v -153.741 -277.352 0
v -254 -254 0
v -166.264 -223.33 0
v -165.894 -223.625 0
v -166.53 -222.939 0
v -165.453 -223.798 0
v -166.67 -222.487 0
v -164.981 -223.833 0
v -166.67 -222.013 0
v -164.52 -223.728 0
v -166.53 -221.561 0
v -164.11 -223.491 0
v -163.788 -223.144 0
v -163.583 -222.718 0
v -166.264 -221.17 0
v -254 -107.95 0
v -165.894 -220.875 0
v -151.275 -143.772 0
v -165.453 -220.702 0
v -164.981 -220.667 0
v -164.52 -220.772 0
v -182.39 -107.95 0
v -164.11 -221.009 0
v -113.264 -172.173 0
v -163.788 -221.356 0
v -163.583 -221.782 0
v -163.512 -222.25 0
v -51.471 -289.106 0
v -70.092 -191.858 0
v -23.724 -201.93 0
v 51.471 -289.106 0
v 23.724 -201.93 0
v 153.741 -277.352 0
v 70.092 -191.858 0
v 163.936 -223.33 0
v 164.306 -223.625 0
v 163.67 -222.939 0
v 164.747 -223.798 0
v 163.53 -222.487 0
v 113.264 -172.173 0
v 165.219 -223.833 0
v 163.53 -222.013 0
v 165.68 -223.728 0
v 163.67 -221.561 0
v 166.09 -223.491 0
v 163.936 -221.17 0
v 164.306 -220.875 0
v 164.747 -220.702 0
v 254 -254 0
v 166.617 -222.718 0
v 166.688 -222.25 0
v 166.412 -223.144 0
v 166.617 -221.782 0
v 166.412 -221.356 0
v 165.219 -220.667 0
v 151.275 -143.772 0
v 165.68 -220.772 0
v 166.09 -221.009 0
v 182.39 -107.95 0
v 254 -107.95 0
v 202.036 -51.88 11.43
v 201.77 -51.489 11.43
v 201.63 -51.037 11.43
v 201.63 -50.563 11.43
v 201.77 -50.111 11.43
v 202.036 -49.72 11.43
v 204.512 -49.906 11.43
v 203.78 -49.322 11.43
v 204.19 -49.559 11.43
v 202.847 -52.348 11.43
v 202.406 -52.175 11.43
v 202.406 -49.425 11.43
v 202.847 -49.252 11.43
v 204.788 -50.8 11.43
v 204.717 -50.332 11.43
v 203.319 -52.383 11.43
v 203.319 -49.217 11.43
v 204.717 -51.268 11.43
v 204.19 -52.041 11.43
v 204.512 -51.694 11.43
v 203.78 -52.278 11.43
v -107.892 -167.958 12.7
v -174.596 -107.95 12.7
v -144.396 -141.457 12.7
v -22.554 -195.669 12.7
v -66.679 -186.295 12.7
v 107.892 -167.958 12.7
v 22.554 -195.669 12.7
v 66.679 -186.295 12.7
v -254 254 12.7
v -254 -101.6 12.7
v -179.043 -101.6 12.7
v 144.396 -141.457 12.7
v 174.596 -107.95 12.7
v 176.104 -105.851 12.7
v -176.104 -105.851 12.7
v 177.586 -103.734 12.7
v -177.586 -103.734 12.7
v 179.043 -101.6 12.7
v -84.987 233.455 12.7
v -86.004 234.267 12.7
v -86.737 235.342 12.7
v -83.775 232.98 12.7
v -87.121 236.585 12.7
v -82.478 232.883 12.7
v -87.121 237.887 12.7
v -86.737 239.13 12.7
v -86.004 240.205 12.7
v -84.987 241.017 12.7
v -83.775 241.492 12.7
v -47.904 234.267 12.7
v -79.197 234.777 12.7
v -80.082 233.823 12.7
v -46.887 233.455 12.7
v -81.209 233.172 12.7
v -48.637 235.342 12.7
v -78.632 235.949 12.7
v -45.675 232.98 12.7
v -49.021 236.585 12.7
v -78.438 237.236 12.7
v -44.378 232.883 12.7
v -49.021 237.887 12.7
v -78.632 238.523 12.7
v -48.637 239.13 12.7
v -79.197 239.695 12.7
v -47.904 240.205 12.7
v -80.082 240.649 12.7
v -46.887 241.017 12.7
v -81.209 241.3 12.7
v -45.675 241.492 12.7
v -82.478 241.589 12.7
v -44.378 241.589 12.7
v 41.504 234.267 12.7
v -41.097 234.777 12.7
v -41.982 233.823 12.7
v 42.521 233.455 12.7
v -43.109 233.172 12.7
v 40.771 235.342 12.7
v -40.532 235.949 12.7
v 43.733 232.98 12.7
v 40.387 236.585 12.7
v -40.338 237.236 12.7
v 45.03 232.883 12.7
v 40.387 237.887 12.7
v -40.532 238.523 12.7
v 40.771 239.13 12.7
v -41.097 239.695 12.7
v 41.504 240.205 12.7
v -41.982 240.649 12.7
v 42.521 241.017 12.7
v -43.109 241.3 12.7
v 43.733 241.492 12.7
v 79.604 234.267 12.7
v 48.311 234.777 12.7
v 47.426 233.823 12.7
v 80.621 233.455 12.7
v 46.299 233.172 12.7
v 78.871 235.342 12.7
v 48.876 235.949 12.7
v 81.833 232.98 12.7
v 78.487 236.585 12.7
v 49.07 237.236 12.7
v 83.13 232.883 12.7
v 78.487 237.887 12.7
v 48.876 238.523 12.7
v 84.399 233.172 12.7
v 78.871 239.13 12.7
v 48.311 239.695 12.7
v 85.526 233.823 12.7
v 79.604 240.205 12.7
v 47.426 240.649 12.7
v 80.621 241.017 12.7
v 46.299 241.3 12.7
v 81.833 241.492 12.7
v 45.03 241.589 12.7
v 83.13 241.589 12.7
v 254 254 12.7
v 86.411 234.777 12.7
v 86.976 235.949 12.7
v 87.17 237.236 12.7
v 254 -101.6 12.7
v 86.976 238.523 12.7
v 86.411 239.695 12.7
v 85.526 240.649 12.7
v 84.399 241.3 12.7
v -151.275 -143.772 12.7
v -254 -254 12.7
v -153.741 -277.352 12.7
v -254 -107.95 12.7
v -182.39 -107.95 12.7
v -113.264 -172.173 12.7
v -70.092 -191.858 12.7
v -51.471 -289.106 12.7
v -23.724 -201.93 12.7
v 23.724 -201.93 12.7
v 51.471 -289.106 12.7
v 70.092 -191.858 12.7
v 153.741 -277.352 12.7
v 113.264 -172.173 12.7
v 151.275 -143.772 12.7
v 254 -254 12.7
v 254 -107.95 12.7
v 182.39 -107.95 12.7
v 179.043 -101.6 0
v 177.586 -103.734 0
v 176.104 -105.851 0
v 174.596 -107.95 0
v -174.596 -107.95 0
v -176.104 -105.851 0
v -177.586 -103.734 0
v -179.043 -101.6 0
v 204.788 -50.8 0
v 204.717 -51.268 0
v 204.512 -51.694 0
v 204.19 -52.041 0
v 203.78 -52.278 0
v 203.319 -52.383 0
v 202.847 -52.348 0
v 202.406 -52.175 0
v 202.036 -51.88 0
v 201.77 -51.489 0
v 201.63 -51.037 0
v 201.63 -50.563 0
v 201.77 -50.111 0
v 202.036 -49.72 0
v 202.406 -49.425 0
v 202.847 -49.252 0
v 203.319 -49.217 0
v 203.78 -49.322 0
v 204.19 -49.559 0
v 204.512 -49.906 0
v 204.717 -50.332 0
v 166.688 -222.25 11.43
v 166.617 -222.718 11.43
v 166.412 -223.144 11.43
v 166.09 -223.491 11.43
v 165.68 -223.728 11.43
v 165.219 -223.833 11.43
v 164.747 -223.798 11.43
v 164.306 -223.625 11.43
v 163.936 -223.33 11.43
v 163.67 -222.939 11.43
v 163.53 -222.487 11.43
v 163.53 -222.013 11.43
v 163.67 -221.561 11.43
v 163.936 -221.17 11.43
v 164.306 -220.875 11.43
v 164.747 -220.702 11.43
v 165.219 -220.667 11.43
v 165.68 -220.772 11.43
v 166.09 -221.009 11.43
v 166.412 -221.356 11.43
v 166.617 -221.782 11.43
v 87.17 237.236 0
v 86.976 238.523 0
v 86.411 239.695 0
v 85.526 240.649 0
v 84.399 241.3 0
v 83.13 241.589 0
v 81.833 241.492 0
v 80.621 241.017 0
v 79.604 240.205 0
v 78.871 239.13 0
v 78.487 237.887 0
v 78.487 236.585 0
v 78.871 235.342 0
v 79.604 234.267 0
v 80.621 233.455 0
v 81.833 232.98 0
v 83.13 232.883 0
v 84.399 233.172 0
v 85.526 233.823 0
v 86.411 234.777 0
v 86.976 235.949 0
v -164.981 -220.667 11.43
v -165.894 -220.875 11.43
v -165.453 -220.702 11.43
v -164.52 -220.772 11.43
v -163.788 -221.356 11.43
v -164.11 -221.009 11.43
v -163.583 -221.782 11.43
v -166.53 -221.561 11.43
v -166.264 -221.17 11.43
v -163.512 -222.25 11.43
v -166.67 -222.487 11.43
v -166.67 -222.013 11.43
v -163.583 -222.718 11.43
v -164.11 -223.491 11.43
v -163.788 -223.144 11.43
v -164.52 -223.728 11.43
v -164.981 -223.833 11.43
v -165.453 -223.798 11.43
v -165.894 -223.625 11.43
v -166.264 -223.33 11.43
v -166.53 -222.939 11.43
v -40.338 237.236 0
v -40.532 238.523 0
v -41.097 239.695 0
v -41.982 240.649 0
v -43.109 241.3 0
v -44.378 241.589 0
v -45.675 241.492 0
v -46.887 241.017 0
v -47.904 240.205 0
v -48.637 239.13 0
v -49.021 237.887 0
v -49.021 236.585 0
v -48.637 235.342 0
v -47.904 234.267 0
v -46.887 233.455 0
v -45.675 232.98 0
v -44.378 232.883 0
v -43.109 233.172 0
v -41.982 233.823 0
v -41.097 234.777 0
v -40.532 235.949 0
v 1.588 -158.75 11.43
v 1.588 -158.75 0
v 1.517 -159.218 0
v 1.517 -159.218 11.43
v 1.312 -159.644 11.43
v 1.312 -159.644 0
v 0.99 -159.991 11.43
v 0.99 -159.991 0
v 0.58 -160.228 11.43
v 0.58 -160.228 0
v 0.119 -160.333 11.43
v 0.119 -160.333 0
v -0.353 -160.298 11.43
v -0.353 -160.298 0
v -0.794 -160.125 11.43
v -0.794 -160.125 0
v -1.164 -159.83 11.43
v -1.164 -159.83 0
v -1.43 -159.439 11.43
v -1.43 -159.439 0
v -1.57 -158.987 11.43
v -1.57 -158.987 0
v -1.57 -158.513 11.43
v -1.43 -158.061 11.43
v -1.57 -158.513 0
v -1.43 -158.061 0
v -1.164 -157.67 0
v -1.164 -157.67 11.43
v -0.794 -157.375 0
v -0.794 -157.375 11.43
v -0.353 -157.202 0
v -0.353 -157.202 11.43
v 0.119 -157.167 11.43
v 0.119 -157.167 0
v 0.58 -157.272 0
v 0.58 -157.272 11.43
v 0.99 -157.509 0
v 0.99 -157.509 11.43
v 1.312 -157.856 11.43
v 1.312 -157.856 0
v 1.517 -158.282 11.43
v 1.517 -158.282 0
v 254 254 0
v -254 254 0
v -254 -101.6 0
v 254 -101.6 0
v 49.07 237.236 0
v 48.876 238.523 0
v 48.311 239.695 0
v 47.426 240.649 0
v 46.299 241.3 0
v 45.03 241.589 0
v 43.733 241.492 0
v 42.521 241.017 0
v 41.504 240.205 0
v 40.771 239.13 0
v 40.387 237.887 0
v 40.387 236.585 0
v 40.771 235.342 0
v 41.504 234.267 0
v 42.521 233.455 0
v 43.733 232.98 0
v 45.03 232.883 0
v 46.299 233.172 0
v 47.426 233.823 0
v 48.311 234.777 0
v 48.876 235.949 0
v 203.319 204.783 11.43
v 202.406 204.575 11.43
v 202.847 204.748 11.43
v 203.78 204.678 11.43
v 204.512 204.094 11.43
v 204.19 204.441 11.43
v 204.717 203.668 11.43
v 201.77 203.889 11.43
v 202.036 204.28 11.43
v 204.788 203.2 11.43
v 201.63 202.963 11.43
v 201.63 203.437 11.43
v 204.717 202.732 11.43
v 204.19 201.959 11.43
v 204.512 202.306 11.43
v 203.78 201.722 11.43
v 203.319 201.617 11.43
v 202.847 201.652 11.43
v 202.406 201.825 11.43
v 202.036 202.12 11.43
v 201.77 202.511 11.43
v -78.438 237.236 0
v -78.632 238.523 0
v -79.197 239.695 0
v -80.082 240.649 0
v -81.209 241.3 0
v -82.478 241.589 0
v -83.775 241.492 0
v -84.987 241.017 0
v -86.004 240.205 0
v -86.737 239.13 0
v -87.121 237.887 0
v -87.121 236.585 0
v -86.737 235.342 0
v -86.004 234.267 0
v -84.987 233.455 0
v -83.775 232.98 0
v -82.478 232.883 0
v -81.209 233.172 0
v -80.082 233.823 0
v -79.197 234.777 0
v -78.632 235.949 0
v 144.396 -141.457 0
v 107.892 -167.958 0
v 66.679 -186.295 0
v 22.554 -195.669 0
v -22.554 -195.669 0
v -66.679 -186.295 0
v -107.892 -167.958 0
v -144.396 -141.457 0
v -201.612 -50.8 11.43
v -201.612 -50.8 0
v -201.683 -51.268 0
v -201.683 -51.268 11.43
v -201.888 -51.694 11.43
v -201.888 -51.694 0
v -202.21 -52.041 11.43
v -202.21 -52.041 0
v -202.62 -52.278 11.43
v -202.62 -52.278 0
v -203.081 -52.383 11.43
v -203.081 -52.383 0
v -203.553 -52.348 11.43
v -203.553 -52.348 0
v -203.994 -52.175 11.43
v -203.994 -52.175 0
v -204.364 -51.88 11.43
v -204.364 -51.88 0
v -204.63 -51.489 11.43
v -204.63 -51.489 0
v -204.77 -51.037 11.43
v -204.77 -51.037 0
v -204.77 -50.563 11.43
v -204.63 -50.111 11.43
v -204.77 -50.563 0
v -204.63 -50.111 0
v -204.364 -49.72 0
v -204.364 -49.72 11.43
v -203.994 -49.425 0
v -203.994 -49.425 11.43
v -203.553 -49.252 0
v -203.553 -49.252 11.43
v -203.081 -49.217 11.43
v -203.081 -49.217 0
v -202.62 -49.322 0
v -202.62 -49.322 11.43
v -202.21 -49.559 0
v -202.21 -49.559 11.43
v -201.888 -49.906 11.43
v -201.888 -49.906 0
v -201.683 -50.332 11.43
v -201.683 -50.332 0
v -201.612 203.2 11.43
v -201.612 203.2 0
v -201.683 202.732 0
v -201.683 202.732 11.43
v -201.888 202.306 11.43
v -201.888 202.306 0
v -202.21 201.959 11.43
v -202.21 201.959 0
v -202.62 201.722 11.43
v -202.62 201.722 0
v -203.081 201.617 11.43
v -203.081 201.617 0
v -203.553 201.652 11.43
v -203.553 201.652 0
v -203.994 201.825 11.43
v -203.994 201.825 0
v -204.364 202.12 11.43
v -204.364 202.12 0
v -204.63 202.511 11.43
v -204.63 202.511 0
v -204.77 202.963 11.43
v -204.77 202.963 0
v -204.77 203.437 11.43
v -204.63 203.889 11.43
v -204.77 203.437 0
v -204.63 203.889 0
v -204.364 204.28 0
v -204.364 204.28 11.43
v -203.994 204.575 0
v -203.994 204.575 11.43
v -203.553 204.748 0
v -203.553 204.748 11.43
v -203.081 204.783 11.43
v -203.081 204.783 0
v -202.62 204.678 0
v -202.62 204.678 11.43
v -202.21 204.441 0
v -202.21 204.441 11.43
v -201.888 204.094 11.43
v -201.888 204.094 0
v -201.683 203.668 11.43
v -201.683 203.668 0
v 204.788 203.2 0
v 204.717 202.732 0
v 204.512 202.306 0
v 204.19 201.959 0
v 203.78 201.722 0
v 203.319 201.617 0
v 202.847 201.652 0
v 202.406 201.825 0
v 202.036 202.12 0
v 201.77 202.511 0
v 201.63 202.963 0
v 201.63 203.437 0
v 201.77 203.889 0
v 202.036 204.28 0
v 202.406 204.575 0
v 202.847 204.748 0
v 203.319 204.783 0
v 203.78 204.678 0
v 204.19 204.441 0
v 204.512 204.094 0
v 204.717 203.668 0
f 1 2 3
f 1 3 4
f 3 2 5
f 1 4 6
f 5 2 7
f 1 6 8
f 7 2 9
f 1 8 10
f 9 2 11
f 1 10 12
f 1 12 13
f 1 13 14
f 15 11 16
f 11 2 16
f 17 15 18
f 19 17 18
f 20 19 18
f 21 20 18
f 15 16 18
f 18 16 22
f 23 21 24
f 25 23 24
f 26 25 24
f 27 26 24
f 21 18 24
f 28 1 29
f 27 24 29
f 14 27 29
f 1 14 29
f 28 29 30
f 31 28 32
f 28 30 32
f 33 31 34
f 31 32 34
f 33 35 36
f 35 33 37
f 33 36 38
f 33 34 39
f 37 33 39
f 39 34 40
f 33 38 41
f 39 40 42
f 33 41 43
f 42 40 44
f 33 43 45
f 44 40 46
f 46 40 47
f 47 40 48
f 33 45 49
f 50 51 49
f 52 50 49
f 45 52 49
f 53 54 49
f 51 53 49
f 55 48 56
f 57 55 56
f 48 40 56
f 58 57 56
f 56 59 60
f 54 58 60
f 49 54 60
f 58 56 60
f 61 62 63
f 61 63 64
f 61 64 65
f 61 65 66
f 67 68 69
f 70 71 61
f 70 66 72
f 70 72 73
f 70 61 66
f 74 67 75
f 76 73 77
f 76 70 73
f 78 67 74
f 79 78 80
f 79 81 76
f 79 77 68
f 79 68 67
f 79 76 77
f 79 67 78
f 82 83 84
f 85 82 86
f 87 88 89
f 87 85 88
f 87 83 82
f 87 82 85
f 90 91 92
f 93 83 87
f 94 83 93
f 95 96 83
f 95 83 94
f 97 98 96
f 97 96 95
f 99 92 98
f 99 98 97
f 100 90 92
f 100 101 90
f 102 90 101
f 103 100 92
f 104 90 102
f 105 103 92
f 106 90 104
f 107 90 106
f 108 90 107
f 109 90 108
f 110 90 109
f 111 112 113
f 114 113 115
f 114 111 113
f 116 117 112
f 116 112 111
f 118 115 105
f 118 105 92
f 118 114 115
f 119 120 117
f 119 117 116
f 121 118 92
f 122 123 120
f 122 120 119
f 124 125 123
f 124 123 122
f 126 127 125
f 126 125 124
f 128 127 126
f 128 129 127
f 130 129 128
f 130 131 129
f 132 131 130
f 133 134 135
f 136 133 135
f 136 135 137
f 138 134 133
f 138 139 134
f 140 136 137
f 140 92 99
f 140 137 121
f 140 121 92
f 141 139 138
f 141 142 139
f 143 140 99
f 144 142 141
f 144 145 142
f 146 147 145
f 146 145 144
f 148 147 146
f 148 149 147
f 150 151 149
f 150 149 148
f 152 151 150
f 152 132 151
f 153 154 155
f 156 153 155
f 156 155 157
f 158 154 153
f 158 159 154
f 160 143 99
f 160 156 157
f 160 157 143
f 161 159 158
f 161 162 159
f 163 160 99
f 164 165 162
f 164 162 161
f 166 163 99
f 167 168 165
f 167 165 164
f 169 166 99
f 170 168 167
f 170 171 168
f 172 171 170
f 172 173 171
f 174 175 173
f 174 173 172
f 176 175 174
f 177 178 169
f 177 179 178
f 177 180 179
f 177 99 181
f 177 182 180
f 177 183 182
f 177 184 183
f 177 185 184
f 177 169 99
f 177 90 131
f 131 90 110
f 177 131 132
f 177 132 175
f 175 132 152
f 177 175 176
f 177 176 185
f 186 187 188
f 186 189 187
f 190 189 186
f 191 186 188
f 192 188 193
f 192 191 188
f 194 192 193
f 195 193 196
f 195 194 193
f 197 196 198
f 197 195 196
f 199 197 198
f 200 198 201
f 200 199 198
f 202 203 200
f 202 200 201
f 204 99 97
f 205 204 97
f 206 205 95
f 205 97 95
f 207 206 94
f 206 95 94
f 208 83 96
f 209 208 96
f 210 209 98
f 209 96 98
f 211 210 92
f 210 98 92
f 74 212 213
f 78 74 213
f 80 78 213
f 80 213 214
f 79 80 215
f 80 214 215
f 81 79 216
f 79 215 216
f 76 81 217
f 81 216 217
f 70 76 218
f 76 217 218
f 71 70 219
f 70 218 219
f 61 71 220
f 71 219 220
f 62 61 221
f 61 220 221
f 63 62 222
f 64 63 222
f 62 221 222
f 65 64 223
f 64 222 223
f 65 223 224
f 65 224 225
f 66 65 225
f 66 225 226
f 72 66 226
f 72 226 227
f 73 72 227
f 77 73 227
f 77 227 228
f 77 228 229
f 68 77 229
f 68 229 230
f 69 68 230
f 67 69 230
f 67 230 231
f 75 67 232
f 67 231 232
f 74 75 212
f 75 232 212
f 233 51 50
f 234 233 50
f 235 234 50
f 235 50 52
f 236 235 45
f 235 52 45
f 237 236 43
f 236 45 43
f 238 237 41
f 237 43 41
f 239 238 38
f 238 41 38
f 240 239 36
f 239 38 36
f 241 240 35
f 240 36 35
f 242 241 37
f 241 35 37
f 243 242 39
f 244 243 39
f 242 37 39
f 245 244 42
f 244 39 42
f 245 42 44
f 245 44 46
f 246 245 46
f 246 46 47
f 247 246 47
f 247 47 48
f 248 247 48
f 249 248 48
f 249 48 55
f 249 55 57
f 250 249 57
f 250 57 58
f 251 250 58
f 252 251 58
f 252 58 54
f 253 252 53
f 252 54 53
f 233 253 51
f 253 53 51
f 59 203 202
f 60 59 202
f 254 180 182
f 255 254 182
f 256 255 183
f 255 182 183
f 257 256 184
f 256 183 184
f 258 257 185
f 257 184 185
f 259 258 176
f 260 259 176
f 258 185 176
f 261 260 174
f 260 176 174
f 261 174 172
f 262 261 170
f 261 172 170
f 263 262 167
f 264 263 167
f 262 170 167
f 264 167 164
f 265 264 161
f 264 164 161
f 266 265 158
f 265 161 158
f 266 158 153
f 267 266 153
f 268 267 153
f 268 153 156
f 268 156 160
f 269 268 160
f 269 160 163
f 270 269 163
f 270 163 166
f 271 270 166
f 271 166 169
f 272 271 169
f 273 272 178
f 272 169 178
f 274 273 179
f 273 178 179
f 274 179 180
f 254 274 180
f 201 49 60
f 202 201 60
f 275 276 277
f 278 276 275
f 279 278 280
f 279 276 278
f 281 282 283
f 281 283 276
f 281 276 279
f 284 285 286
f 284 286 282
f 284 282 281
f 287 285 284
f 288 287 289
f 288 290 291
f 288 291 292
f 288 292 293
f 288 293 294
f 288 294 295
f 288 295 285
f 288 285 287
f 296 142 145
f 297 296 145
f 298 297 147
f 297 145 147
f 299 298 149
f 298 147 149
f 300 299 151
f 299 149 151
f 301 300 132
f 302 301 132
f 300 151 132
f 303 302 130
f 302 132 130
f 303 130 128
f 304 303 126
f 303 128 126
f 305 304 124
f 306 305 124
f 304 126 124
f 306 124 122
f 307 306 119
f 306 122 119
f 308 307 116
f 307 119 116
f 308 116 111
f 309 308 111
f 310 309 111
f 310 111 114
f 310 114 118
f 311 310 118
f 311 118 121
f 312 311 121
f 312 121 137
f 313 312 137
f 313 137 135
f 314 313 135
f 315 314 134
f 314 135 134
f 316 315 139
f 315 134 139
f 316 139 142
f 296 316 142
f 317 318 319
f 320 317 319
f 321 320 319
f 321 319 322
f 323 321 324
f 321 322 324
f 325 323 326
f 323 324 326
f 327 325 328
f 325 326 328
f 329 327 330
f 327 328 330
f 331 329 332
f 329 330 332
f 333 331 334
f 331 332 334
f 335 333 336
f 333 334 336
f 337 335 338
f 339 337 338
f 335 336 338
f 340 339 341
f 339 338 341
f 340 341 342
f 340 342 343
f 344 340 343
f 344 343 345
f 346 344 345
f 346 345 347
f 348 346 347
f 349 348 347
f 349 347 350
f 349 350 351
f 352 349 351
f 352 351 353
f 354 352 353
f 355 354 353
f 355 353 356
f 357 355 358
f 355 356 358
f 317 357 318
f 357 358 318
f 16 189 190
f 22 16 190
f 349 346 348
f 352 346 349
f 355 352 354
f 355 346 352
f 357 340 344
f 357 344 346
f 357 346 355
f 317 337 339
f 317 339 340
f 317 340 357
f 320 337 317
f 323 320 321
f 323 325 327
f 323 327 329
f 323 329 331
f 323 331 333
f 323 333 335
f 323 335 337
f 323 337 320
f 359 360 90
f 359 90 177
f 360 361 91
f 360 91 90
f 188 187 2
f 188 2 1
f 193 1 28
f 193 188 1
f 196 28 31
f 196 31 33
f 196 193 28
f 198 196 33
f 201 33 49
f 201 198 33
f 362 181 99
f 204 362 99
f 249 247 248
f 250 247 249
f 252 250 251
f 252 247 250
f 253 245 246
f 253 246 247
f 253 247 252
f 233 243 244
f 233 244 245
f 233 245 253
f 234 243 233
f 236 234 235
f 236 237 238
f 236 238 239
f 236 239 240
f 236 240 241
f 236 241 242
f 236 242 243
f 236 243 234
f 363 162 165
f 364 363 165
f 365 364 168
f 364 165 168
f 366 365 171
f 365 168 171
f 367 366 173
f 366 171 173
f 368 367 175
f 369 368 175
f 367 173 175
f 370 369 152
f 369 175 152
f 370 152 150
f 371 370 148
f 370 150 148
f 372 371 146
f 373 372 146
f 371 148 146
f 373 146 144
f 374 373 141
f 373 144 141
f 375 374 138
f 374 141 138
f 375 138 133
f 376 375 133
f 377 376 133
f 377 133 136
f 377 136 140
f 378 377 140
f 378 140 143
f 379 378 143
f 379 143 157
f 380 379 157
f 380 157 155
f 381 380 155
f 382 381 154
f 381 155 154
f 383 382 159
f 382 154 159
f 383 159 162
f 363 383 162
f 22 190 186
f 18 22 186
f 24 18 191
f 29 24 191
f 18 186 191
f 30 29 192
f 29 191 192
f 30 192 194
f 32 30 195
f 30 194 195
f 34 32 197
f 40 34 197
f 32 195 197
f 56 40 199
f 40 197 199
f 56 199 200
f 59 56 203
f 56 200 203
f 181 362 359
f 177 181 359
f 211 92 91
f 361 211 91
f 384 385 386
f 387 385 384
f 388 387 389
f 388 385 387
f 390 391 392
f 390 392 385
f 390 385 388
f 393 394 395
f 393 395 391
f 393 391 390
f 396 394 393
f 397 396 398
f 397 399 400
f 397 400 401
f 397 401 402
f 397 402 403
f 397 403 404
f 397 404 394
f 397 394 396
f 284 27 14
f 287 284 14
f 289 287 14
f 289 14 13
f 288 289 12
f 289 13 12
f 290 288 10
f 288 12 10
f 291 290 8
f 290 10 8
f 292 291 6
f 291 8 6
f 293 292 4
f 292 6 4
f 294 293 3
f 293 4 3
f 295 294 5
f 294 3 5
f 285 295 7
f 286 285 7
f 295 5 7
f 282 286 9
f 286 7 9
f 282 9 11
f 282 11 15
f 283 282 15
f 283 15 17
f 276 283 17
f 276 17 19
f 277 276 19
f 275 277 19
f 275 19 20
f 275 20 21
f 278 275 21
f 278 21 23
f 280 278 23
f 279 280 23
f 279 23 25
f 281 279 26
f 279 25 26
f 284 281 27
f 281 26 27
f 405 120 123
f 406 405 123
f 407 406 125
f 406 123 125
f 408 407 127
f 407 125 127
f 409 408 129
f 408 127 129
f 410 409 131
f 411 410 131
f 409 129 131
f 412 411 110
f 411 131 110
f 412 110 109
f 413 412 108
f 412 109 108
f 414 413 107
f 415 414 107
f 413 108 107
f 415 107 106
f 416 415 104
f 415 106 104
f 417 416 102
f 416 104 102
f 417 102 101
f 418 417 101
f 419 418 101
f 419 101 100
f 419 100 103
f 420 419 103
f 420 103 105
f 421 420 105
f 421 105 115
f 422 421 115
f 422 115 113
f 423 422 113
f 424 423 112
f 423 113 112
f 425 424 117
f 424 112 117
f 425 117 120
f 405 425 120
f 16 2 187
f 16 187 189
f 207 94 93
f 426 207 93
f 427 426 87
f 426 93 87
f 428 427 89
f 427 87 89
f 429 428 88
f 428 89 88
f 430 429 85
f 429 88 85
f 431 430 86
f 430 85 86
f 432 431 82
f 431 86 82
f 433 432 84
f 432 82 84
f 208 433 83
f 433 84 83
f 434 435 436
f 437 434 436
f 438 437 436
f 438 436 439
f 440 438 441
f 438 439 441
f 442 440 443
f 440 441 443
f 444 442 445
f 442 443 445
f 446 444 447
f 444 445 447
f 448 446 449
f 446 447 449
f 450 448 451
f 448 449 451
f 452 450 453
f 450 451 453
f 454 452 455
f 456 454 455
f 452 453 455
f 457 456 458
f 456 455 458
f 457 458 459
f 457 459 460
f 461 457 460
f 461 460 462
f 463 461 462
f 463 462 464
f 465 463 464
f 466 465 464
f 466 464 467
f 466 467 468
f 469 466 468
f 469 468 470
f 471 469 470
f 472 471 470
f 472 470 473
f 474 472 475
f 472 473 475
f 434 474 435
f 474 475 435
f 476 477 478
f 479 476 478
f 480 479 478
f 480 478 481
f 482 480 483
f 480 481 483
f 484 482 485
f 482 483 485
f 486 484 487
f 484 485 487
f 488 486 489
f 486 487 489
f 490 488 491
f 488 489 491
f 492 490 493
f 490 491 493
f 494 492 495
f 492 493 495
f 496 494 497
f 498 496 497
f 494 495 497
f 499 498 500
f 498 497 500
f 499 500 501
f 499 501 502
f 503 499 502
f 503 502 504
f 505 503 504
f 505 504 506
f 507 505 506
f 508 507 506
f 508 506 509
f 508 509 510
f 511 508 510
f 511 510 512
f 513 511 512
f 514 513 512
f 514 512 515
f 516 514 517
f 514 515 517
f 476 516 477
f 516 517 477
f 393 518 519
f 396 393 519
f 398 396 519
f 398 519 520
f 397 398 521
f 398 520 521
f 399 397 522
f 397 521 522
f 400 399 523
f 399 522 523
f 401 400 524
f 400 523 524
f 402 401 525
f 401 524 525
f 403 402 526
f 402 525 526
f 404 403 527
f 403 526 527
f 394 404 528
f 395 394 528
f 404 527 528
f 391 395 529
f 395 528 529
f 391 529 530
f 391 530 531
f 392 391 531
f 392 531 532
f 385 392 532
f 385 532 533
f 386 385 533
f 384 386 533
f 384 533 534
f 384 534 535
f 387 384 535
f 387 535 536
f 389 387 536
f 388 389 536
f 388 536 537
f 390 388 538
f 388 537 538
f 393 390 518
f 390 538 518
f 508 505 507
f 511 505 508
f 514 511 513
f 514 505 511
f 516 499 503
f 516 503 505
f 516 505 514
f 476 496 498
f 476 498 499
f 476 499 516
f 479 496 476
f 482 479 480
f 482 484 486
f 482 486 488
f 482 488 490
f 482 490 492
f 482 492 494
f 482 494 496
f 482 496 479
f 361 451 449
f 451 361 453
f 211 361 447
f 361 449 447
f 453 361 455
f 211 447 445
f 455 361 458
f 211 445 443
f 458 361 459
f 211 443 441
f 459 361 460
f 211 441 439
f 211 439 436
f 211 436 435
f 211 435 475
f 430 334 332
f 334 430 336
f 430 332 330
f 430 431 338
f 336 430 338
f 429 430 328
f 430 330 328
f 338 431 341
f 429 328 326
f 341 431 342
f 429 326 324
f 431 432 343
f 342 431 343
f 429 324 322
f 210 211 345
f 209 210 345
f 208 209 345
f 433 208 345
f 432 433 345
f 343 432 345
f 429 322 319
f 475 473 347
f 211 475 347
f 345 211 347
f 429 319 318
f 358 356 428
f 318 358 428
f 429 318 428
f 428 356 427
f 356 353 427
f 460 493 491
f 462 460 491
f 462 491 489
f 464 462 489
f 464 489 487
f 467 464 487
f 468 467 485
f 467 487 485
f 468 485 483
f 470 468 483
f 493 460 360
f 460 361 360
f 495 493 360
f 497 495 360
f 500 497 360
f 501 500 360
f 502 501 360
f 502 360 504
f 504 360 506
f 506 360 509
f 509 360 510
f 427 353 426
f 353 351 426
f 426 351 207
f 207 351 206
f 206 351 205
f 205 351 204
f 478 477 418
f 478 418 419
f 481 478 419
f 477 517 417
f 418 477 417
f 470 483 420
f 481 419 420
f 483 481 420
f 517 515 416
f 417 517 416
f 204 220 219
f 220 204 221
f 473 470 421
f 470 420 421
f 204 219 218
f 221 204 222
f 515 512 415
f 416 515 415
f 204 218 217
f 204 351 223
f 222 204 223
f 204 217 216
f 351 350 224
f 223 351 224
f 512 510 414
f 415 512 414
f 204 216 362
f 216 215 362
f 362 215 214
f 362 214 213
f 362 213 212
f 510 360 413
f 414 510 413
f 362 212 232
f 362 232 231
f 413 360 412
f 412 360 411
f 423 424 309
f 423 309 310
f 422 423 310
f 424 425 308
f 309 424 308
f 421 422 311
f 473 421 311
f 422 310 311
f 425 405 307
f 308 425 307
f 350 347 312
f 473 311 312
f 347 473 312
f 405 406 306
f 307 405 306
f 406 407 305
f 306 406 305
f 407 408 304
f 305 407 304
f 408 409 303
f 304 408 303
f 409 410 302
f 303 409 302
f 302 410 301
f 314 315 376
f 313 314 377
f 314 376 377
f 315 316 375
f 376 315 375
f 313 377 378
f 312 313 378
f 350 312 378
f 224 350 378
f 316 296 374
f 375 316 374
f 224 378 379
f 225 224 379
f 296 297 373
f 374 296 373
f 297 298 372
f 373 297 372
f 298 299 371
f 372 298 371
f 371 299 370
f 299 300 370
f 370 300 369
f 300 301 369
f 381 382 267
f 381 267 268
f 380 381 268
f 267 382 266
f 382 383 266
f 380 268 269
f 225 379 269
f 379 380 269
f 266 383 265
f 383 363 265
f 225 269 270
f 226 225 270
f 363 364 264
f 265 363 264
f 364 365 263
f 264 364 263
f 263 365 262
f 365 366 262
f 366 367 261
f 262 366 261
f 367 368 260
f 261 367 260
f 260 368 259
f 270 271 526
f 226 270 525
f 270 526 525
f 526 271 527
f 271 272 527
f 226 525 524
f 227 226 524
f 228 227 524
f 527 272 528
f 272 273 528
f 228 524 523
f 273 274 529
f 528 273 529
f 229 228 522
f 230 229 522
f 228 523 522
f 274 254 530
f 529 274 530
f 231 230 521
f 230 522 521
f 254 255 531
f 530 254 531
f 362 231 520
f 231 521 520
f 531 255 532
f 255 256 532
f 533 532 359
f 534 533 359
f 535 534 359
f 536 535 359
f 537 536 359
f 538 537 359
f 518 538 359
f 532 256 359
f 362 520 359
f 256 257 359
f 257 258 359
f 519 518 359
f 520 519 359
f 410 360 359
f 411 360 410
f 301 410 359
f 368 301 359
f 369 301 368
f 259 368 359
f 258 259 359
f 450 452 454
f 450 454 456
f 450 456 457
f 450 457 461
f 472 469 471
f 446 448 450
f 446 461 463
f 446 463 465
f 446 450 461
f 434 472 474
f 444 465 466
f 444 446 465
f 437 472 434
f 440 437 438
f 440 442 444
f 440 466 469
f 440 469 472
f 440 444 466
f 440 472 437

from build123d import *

# Parameters (mm, degrees)
F0_W      = 508
F0_H      = 508
F1_DEPTH  = 12.7
F3_DEPTH  = 25.4
F5_DEPTH  = 12.7
F6_R      = 1.5875
F7_DEPTH  = 11.43
F8_R      = 1.5875
F9_DEPTH  = 11.43
F10_R     = 4.365625
F11_DEPTH = 12.7


with BuildPart() as f1:
    # F0 (on Top) → F1 (new body)
    with BuildSketch(Plane.XY):
        Rectangle(F0_W, F0_H)
    extrude(amount=F1_DEPTH)

    # F2 (on face) → F3 (cut)
    with BuildSketch(Plane.XY.offset(12.7)):
        with BuildLine():
            ThreePointArc((174.5961339778, -107.95), (0, -196.85), (-174.5961339778, -107.95))
            ThreePointArc((-174.5961339778, -107.95), (-176.8480584357, -104.7949604446), (-179.0429766844, -101.6))
            Line((-179.0429766844, -101.6), (-186.6511184001, -101.6))
            Line((-186.6511184001, -101.6), (-254, -101.6))
            Line((-254, -101.6), (-254, -107.95))
            Line((-254, -107.95), (-182.3898640276, -107.95))
            ThreePointArc((-182.3898640276, -107.95), (0, -203.2), (182.3898640276, -107.95))
            Line((182.3898640276, -107.95), (254, -107.95))
            Line((254, -107.95), (254, -101.6))
            Line((254, -101.6), (186.6511184001, -101.6))
            Line((186.6511184001, -101.6), (179.0429766844, -101.6))
            ThreePointArc((179.0429766844, -101.6), (176.8480584357, -104.7949604446), (174.5961339778, -107.95))
        make_face()
    extrude(amount=-F3_DEPTH, mode=Mode.SUBTRACT)

    # F4 (on face) → F5 (join, through all)
    with BuildSketch(Plane.XY.offset(12.7)):
        with BuildLine():
            Line((254, -254), (-254, -254))
            ThreePointArc((-254, -254), (0, -290.5782934508), (254, -254))
        make_face()
    extrude(amount=-F5_DEPTH)

    # F6 (on face) → F7 (cut)
    with BuildSketch(Plane(origin=(0, 0, 0), x_dir=(1, 0, 0), z_dir=(0, 0, -1))):
        with Locations((203.2, -203.2)):
            Circle(F6_R)
        with Locations((-203.2, -203.2)):
            Circle(F6_R)
        with Locations((-203.2, 50.8)):
            Circle(F6_R)
        with Locations((203.2, 50.8)):
            Circle(F6_R)
        with Locations((0, 158.75)):
            Circle(F6_R)
    extrude(amount=-F7_DEPTH, mode=Mode.SUBTRACT)

    # F8 (on face) → F9 (cut)
    with BuildSketch(Plane(origin=(0, 0, 0), x_dir=(1, 0, 0), z_dir=(0, 0, -1))):
        with Locations((-165.1, 222.25)):
            Circle(F8_R)
        with Locations((165.1, 222.25)):
            Circle(F8_R)
    extrude(amount=-F9_DEPTH, mode=Mode.SUBTRACT)

    # F10 (on face) → F11 (cut, through all)
    with BuildSketch(Plane.XY.offset(12.7)):
        with Locations((44.704, 237.236)):
            Circle(F10_R)
        with Locations((82.804, 237.236)):
            Circle(F10_R)
        with Locations((-44.704, 237.236)):
            Circle(F10_R)
        with Locations((-82.804, 237.236)):
            Circle(F10_R)
    extrude(amount=-F11_DEPTH, mode=Mode.SUBTRACT)


solid = f1.part
